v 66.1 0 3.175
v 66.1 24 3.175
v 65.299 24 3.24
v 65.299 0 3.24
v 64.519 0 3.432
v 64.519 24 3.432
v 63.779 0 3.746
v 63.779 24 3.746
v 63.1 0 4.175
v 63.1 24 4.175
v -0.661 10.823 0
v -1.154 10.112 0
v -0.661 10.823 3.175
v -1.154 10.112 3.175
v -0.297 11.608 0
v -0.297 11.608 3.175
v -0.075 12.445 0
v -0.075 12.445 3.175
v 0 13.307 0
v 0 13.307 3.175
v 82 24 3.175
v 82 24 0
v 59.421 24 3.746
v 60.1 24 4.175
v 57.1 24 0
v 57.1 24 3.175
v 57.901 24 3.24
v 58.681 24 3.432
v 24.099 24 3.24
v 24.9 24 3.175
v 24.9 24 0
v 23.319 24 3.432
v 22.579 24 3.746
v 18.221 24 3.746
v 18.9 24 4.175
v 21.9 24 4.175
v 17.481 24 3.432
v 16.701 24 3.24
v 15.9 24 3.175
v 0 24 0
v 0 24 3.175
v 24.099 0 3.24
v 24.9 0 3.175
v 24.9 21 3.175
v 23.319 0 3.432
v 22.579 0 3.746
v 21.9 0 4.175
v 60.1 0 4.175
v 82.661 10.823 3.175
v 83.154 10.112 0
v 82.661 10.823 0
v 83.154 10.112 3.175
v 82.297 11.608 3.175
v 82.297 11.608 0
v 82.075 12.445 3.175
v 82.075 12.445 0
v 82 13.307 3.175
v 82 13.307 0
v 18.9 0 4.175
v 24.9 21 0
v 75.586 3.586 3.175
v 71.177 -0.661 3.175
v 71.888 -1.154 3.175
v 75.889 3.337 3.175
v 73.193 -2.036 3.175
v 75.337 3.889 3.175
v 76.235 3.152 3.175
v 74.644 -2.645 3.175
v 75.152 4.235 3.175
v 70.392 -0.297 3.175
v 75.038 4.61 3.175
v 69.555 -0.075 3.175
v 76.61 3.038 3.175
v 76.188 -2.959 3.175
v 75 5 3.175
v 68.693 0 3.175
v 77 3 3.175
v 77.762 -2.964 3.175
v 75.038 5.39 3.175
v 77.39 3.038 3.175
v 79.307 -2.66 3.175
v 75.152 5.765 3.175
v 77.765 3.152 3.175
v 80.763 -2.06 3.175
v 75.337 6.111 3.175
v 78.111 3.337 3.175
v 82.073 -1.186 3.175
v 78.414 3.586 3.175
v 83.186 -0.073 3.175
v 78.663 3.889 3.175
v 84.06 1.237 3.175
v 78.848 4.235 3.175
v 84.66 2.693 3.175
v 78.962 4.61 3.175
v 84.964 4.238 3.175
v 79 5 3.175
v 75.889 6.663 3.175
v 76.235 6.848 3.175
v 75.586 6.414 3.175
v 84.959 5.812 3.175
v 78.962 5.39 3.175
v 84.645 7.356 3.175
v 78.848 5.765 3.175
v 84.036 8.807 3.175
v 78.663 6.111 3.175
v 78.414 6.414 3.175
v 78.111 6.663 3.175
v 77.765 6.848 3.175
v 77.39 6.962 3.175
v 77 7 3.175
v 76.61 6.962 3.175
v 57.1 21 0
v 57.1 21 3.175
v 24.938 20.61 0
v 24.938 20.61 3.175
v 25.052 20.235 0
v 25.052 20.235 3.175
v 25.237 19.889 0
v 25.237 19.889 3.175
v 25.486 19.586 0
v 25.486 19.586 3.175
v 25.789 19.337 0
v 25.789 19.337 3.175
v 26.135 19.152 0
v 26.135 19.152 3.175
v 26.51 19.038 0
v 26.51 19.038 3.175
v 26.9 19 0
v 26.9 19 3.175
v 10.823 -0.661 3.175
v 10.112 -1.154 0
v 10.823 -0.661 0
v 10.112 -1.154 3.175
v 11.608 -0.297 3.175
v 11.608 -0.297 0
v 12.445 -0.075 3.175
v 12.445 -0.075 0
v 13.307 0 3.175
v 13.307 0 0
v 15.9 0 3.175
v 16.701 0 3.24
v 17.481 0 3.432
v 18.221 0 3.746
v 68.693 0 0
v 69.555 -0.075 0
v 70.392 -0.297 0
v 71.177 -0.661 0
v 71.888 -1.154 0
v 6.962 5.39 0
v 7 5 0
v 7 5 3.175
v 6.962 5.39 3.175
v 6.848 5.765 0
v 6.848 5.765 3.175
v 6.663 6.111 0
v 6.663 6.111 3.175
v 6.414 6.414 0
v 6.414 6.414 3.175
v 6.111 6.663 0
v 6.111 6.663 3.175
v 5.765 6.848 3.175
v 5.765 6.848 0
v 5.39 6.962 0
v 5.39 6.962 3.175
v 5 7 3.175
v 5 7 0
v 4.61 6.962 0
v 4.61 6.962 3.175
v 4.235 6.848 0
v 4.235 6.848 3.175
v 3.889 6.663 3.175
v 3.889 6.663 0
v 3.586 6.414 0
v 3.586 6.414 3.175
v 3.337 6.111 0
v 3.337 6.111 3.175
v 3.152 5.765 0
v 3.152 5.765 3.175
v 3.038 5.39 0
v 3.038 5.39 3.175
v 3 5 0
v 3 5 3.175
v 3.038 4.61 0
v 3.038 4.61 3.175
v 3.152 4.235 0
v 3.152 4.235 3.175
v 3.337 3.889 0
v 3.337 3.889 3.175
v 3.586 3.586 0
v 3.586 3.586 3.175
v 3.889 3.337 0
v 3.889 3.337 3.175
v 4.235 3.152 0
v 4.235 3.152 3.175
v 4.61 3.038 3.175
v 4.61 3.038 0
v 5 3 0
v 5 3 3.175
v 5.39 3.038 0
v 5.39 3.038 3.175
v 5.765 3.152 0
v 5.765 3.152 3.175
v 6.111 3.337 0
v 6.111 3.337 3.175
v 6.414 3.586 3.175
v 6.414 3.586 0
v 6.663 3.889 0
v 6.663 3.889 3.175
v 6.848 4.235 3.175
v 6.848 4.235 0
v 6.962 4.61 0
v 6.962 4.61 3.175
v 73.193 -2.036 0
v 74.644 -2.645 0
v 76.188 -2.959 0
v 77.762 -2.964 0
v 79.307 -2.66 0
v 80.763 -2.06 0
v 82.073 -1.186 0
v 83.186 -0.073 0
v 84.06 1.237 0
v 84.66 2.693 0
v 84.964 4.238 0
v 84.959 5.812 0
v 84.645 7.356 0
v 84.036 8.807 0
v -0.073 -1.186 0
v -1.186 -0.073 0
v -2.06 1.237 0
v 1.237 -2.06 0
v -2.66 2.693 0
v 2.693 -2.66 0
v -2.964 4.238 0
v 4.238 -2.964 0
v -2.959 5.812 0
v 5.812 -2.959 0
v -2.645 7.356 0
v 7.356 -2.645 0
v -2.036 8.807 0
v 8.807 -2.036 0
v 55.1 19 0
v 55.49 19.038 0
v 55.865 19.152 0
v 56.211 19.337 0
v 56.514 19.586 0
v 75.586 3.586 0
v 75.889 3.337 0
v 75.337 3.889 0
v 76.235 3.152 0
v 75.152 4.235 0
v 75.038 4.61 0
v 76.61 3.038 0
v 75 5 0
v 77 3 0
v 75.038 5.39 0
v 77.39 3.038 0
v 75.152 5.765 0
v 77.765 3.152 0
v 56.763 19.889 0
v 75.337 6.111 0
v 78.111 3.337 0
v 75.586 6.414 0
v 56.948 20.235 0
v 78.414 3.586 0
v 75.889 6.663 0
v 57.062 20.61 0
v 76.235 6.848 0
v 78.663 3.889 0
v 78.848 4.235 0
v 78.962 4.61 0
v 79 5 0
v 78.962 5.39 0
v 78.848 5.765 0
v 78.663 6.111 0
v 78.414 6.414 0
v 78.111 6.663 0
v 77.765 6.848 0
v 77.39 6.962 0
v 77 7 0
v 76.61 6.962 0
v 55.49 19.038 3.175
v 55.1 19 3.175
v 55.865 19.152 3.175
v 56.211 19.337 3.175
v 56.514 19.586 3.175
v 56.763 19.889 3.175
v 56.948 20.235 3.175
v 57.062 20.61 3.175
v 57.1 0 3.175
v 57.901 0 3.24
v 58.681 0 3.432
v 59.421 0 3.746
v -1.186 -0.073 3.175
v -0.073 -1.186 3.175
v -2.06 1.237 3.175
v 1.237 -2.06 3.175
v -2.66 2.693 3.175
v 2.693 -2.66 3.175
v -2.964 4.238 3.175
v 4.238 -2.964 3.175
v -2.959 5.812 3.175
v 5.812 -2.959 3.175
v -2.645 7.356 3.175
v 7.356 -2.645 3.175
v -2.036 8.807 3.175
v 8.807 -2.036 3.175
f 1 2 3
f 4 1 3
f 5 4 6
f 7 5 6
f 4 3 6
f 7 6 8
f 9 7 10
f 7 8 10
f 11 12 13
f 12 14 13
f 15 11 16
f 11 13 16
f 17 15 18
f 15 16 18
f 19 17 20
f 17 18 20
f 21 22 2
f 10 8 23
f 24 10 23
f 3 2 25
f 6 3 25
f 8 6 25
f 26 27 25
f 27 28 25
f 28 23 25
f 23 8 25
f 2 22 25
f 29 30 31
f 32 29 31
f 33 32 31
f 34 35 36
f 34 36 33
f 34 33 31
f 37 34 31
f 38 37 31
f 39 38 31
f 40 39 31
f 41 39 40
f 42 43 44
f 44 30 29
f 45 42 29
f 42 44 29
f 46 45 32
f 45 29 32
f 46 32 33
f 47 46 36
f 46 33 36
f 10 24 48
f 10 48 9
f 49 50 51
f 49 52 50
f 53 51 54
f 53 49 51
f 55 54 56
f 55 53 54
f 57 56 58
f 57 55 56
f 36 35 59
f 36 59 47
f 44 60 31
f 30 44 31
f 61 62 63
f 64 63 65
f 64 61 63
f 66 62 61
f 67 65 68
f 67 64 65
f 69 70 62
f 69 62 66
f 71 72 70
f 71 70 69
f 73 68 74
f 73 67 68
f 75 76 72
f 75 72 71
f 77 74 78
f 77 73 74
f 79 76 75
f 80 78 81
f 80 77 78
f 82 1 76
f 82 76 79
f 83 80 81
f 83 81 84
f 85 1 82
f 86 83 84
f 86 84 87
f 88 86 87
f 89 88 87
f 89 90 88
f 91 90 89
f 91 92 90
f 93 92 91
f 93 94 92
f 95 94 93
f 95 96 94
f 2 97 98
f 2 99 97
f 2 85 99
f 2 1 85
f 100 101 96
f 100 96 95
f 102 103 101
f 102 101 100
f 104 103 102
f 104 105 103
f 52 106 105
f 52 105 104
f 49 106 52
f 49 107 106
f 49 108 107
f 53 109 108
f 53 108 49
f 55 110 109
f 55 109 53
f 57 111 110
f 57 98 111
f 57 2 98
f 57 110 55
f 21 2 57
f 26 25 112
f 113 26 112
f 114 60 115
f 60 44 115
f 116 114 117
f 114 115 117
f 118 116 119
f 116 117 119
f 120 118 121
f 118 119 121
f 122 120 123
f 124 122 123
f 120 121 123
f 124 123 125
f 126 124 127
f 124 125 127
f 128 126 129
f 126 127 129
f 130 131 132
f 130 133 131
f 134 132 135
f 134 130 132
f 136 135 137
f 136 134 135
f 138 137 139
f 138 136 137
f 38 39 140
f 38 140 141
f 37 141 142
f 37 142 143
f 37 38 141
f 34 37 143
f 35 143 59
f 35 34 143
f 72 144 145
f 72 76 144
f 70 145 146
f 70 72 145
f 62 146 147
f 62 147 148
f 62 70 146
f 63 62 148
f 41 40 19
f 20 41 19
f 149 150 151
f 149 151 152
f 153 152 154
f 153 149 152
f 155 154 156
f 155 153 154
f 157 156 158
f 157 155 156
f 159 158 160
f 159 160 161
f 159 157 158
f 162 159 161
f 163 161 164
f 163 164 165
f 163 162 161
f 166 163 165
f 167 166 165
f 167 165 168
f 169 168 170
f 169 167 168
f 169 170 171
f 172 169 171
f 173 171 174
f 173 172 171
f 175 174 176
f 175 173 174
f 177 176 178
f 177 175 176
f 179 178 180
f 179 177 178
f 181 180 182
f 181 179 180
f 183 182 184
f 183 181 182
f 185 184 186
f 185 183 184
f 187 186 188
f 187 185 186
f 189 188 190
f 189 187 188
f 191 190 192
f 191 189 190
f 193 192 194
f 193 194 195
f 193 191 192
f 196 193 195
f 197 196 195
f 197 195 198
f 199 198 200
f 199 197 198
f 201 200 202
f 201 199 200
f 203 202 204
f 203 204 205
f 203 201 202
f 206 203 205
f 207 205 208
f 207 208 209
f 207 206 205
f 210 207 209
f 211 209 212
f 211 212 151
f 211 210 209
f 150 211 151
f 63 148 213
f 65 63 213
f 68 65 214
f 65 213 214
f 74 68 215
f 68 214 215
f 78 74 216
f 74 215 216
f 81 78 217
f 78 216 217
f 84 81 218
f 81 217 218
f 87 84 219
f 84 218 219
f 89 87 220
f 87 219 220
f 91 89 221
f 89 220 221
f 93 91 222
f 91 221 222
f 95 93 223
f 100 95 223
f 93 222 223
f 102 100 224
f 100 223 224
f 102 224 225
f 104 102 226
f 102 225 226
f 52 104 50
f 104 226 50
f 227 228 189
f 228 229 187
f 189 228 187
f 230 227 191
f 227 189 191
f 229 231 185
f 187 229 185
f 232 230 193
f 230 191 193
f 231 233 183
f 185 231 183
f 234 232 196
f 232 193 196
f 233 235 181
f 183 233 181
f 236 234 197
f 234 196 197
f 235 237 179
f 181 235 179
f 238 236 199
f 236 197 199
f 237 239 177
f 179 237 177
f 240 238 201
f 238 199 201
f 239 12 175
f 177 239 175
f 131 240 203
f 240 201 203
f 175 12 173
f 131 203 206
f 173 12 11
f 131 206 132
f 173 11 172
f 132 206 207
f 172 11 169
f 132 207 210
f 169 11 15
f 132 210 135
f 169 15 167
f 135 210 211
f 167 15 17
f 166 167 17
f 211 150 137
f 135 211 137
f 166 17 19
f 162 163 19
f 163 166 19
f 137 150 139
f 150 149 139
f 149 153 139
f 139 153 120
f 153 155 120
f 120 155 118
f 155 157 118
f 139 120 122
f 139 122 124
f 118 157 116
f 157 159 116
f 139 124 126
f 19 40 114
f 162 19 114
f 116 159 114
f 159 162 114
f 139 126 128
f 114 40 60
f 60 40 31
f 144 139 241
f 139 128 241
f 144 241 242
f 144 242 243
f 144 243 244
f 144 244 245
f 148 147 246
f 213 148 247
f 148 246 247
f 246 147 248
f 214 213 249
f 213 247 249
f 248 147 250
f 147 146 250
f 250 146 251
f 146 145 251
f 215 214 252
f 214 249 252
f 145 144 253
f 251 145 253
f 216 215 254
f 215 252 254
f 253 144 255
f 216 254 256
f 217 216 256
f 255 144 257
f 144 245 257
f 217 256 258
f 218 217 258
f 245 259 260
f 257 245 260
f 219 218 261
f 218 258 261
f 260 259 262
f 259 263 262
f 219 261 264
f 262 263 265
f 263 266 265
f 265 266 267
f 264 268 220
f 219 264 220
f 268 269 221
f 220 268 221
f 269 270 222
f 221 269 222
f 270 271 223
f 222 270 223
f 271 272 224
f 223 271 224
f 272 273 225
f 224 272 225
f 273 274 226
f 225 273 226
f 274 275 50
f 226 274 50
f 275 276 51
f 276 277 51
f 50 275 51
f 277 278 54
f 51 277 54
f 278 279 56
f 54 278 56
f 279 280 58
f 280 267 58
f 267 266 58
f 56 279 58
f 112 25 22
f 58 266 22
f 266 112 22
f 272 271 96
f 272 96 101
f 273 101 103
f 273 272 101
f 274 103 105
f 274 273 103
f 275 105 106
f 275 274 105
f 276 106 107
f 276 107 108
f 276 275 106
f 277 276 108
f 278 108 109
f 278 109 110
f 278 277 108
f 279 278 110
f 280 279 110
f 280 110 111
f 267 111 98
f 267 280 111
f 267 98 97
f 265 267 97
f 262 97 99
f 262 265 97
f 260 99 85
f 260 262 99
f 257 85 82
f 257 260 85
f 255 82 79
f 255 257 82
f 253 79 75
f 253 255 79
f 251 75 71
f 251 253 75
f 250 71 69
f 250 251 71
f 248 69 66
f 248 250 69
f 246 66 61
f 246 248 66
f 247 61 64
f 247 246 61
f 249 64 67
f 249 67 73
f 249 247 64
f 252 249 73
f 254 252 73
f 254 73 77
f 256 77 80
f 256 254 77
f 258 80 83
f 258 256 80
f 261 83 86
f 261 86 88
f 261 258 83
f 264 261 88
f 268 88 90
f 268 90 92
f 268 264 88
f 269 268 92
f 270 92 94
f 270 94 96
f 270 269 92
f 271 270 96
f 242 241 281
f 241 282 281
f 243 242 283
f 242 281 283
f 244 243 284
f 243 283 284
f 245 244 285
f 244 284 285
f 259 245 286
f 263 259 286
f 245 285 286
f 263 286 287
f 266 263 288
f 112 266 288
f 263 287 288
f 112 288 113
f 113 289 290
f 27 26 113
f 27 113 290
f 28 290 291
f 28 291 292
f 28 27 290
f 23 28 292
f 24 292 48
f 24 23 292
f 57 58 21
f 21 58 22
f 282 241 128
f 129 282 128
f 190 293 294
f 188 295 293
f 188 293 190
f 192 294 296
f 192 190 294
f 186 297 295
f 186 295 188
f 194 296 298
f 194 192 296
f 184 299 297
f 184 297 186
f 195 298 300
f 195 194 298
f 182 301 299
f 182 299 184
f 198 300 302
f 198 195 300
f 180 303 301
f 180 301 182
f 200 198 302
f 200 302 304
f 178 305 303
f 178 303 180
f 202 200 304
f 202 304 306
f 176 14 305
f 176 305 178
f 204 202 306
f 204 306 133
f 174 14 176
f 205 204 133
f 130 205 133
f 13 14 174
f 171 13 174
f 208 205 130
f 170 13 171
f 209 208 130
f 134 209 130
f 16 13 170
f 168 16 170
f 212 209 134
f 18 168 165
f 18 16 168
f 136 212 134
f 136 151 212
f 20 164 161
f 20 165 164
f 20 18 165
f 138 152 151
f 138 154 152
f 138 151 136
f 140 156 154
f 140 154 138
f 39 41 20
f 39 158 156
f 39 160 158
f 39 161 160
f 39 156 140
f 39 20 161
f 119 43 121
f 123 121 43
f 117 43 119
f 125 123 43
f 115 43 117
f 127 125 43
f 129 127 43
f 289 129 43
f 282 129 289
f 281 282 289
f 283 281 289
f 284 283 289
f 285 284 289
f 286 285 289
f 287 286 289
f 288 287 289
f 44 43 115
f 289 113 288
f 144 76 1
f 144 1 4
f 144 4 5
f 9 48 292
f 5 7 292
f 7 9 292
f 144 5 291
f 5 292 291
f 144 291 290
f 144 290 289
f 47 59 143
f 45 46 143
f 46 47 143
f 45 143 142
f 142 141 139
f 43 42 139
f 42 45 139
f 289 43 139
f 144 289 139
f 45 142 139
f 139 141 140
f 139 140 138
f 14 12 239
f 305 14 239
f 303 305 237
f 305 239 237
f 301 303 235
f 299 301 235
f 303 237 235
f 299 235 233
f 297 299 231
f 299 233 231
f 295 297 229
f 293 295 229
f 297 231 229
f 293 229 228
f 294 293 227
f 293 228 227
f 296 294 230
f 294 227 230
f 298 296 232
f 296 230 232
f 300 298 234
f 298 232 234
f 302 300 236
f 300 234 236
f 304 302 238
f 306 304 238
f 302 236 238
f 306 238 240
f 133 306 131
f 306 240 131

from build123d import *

# Parameters (mm, degrees)
F0_R        = 2
F1_DEPTH    = 3.175
F2_R        = 5
F3_R        = 2
F4_W        = 3
F4_H        = 24
F5_DEPTH    = 1
F6_T1_DEPTH = 24


# Not quite as in the source:
# - a fillet or chamfer that OpenCascade refuses, or shapes differently, is made with other operations: its cross-section is extruded or revolved along the edge and cut away or added


with BuildPart() as f1:
    # F0 (on Top) → F1 (new body)
    with BuildSketch(Plane.XY):
        with BuildLine():
            Line((11.2449979984, 0), (0, 0))
            Line((0, 0), (0, 11.2449979984))
            ThreePointArc((0, 11.2449979984), (-0.6568542495, -0.6568542495), (11.2449979984, 0))
        make_face()
        Polygon((0, 11.2449979984), (0, 0), (11.2449979984, 0), (41, 0), (70.7550020016, 0), (82, 0), (82, 11.2449979984), (82, 24), (57.1, 24), (57.1, 19), (41, 19), (24.9, 19), (24.9, 24), (0, 24), align=None)
        with Locations((5, 5)):
            Circle(F0_R, mode=Mode.SUBTRACT)
        with Locations((77, 5)):
            Circle(F0_R, mode=Mode.SUBTRACT)
        with BuildLine():
            Line((82, 0), (70.7550020016, 0))
            ThreePointArc((70.7550020016, 0), (82.6568542495, -0.6568542495), (82, 11.2449979984))
            Line((82, 11.2449979984), (82, 0))
        make_face()
    extrude(amount=F1_DEPTH)

    # F2
    f2_edges = [f1.edges().sort_by_distance(p)[0] for p in [
        (11.244998, 0, 1.5875),
        (70.755002, 0, 1.5875),
        (82, 11.244998, 1.5875),
        (0, 11.244998, 1.5875),
    ]]
    fillet(f2_edges, radius=F2_R)

    # F3
    f3_edges = [f1.edges().sort_by_distance(p)[0] for p in [
        (24.9, 19, 1.5875),
        (57.1, 19, 1.5875),
    ]]
    fillet(f3_edges, radius=F3_R)

    # F4 (on face) → F5 (join)
    with BuildSketch(Plane.XY.offset(3.175)):
        with Locations((20.4, 12)):
            Rectangle(F4_W, F4_H)
        with Locations((61.6, 12)):
            Rectangle(F4_W, F4_H)
    extrude(amount=F5_DEPTH)

    # F6: fillet of radius 5 on 4 edges, made by hand

    # F6_s2 → F6_t1 (join)
    with BuildSketch(Plane.XZ.offset(-24)):
        with BuildLine():
            ThreePointArc((15.9, 3.175), (17.4811388301, 3.4315835097), (18.9, 4.175))
            Line((18.9, 4.175), (18.96, 4.095))
            ThreePointArc((18.96, 4.095), (19, 3.675), (19, 3.175))
            Line((19, 3.175), (18.9, 3.075))
            Line((18.9, 3.075), (15.9, 3.075))
            Line((15.9, 3.075), (15.9, 3.175))
        make_face()
        with BuildLine():
            ThreePointArc((24.9, 3.175), (23.3188611699, 3.4315835097), (21.9, 4.175))
            Line((21.9, 4.175), (21.84, 4.095))
            ThreePointArc((21.84, 4.095), (21.8, 3.675), (21.8, 3.175))
            Line((21.8, 3.175), (21.9, 3.075))
            Line((21.9, 3.075), (24.9, 3.075))
            Line((24.9, 3.075), (24.9, 3.175))
        make_face()
        with BuildLine():
            ThreePointArc((57.1, 3.175), (58.6811388301, 3.4315835097), (60.1, 4.175))
            Line((60.1, 4.175), (60.16, 4.095))
            ThreePointArc((60.16, 4.095), (60.2, 3.675), (60.2, 3.175))
            Line((60.2, 3.175), (60.1, 3.075))
            Line((60.1, 3.075), (57.1, 3.075))
            Line((57.1, 3.075), (57.1, 3.175))
        make_face()
        with BuildLine():
            ThreePointArc((66.1, 3.175), (64.5188611699, 3.4315835097), (63.1, 4.175))
            Line((63.1, 4.175), (63.04, 4.095))
            ThreePointArc((63.04, 4.095), (63, 3.675), (63, 3.175))
            Line((63, 3.175), (63.1, 3.075))
            Line((63.1, 3.075), (66.1, 3.075))
            Line((66.1, 3.075), (66.1, 3.175))
        make_face()
    extrude(amount=F6_T1_DEPTH)


solid = f1.part
